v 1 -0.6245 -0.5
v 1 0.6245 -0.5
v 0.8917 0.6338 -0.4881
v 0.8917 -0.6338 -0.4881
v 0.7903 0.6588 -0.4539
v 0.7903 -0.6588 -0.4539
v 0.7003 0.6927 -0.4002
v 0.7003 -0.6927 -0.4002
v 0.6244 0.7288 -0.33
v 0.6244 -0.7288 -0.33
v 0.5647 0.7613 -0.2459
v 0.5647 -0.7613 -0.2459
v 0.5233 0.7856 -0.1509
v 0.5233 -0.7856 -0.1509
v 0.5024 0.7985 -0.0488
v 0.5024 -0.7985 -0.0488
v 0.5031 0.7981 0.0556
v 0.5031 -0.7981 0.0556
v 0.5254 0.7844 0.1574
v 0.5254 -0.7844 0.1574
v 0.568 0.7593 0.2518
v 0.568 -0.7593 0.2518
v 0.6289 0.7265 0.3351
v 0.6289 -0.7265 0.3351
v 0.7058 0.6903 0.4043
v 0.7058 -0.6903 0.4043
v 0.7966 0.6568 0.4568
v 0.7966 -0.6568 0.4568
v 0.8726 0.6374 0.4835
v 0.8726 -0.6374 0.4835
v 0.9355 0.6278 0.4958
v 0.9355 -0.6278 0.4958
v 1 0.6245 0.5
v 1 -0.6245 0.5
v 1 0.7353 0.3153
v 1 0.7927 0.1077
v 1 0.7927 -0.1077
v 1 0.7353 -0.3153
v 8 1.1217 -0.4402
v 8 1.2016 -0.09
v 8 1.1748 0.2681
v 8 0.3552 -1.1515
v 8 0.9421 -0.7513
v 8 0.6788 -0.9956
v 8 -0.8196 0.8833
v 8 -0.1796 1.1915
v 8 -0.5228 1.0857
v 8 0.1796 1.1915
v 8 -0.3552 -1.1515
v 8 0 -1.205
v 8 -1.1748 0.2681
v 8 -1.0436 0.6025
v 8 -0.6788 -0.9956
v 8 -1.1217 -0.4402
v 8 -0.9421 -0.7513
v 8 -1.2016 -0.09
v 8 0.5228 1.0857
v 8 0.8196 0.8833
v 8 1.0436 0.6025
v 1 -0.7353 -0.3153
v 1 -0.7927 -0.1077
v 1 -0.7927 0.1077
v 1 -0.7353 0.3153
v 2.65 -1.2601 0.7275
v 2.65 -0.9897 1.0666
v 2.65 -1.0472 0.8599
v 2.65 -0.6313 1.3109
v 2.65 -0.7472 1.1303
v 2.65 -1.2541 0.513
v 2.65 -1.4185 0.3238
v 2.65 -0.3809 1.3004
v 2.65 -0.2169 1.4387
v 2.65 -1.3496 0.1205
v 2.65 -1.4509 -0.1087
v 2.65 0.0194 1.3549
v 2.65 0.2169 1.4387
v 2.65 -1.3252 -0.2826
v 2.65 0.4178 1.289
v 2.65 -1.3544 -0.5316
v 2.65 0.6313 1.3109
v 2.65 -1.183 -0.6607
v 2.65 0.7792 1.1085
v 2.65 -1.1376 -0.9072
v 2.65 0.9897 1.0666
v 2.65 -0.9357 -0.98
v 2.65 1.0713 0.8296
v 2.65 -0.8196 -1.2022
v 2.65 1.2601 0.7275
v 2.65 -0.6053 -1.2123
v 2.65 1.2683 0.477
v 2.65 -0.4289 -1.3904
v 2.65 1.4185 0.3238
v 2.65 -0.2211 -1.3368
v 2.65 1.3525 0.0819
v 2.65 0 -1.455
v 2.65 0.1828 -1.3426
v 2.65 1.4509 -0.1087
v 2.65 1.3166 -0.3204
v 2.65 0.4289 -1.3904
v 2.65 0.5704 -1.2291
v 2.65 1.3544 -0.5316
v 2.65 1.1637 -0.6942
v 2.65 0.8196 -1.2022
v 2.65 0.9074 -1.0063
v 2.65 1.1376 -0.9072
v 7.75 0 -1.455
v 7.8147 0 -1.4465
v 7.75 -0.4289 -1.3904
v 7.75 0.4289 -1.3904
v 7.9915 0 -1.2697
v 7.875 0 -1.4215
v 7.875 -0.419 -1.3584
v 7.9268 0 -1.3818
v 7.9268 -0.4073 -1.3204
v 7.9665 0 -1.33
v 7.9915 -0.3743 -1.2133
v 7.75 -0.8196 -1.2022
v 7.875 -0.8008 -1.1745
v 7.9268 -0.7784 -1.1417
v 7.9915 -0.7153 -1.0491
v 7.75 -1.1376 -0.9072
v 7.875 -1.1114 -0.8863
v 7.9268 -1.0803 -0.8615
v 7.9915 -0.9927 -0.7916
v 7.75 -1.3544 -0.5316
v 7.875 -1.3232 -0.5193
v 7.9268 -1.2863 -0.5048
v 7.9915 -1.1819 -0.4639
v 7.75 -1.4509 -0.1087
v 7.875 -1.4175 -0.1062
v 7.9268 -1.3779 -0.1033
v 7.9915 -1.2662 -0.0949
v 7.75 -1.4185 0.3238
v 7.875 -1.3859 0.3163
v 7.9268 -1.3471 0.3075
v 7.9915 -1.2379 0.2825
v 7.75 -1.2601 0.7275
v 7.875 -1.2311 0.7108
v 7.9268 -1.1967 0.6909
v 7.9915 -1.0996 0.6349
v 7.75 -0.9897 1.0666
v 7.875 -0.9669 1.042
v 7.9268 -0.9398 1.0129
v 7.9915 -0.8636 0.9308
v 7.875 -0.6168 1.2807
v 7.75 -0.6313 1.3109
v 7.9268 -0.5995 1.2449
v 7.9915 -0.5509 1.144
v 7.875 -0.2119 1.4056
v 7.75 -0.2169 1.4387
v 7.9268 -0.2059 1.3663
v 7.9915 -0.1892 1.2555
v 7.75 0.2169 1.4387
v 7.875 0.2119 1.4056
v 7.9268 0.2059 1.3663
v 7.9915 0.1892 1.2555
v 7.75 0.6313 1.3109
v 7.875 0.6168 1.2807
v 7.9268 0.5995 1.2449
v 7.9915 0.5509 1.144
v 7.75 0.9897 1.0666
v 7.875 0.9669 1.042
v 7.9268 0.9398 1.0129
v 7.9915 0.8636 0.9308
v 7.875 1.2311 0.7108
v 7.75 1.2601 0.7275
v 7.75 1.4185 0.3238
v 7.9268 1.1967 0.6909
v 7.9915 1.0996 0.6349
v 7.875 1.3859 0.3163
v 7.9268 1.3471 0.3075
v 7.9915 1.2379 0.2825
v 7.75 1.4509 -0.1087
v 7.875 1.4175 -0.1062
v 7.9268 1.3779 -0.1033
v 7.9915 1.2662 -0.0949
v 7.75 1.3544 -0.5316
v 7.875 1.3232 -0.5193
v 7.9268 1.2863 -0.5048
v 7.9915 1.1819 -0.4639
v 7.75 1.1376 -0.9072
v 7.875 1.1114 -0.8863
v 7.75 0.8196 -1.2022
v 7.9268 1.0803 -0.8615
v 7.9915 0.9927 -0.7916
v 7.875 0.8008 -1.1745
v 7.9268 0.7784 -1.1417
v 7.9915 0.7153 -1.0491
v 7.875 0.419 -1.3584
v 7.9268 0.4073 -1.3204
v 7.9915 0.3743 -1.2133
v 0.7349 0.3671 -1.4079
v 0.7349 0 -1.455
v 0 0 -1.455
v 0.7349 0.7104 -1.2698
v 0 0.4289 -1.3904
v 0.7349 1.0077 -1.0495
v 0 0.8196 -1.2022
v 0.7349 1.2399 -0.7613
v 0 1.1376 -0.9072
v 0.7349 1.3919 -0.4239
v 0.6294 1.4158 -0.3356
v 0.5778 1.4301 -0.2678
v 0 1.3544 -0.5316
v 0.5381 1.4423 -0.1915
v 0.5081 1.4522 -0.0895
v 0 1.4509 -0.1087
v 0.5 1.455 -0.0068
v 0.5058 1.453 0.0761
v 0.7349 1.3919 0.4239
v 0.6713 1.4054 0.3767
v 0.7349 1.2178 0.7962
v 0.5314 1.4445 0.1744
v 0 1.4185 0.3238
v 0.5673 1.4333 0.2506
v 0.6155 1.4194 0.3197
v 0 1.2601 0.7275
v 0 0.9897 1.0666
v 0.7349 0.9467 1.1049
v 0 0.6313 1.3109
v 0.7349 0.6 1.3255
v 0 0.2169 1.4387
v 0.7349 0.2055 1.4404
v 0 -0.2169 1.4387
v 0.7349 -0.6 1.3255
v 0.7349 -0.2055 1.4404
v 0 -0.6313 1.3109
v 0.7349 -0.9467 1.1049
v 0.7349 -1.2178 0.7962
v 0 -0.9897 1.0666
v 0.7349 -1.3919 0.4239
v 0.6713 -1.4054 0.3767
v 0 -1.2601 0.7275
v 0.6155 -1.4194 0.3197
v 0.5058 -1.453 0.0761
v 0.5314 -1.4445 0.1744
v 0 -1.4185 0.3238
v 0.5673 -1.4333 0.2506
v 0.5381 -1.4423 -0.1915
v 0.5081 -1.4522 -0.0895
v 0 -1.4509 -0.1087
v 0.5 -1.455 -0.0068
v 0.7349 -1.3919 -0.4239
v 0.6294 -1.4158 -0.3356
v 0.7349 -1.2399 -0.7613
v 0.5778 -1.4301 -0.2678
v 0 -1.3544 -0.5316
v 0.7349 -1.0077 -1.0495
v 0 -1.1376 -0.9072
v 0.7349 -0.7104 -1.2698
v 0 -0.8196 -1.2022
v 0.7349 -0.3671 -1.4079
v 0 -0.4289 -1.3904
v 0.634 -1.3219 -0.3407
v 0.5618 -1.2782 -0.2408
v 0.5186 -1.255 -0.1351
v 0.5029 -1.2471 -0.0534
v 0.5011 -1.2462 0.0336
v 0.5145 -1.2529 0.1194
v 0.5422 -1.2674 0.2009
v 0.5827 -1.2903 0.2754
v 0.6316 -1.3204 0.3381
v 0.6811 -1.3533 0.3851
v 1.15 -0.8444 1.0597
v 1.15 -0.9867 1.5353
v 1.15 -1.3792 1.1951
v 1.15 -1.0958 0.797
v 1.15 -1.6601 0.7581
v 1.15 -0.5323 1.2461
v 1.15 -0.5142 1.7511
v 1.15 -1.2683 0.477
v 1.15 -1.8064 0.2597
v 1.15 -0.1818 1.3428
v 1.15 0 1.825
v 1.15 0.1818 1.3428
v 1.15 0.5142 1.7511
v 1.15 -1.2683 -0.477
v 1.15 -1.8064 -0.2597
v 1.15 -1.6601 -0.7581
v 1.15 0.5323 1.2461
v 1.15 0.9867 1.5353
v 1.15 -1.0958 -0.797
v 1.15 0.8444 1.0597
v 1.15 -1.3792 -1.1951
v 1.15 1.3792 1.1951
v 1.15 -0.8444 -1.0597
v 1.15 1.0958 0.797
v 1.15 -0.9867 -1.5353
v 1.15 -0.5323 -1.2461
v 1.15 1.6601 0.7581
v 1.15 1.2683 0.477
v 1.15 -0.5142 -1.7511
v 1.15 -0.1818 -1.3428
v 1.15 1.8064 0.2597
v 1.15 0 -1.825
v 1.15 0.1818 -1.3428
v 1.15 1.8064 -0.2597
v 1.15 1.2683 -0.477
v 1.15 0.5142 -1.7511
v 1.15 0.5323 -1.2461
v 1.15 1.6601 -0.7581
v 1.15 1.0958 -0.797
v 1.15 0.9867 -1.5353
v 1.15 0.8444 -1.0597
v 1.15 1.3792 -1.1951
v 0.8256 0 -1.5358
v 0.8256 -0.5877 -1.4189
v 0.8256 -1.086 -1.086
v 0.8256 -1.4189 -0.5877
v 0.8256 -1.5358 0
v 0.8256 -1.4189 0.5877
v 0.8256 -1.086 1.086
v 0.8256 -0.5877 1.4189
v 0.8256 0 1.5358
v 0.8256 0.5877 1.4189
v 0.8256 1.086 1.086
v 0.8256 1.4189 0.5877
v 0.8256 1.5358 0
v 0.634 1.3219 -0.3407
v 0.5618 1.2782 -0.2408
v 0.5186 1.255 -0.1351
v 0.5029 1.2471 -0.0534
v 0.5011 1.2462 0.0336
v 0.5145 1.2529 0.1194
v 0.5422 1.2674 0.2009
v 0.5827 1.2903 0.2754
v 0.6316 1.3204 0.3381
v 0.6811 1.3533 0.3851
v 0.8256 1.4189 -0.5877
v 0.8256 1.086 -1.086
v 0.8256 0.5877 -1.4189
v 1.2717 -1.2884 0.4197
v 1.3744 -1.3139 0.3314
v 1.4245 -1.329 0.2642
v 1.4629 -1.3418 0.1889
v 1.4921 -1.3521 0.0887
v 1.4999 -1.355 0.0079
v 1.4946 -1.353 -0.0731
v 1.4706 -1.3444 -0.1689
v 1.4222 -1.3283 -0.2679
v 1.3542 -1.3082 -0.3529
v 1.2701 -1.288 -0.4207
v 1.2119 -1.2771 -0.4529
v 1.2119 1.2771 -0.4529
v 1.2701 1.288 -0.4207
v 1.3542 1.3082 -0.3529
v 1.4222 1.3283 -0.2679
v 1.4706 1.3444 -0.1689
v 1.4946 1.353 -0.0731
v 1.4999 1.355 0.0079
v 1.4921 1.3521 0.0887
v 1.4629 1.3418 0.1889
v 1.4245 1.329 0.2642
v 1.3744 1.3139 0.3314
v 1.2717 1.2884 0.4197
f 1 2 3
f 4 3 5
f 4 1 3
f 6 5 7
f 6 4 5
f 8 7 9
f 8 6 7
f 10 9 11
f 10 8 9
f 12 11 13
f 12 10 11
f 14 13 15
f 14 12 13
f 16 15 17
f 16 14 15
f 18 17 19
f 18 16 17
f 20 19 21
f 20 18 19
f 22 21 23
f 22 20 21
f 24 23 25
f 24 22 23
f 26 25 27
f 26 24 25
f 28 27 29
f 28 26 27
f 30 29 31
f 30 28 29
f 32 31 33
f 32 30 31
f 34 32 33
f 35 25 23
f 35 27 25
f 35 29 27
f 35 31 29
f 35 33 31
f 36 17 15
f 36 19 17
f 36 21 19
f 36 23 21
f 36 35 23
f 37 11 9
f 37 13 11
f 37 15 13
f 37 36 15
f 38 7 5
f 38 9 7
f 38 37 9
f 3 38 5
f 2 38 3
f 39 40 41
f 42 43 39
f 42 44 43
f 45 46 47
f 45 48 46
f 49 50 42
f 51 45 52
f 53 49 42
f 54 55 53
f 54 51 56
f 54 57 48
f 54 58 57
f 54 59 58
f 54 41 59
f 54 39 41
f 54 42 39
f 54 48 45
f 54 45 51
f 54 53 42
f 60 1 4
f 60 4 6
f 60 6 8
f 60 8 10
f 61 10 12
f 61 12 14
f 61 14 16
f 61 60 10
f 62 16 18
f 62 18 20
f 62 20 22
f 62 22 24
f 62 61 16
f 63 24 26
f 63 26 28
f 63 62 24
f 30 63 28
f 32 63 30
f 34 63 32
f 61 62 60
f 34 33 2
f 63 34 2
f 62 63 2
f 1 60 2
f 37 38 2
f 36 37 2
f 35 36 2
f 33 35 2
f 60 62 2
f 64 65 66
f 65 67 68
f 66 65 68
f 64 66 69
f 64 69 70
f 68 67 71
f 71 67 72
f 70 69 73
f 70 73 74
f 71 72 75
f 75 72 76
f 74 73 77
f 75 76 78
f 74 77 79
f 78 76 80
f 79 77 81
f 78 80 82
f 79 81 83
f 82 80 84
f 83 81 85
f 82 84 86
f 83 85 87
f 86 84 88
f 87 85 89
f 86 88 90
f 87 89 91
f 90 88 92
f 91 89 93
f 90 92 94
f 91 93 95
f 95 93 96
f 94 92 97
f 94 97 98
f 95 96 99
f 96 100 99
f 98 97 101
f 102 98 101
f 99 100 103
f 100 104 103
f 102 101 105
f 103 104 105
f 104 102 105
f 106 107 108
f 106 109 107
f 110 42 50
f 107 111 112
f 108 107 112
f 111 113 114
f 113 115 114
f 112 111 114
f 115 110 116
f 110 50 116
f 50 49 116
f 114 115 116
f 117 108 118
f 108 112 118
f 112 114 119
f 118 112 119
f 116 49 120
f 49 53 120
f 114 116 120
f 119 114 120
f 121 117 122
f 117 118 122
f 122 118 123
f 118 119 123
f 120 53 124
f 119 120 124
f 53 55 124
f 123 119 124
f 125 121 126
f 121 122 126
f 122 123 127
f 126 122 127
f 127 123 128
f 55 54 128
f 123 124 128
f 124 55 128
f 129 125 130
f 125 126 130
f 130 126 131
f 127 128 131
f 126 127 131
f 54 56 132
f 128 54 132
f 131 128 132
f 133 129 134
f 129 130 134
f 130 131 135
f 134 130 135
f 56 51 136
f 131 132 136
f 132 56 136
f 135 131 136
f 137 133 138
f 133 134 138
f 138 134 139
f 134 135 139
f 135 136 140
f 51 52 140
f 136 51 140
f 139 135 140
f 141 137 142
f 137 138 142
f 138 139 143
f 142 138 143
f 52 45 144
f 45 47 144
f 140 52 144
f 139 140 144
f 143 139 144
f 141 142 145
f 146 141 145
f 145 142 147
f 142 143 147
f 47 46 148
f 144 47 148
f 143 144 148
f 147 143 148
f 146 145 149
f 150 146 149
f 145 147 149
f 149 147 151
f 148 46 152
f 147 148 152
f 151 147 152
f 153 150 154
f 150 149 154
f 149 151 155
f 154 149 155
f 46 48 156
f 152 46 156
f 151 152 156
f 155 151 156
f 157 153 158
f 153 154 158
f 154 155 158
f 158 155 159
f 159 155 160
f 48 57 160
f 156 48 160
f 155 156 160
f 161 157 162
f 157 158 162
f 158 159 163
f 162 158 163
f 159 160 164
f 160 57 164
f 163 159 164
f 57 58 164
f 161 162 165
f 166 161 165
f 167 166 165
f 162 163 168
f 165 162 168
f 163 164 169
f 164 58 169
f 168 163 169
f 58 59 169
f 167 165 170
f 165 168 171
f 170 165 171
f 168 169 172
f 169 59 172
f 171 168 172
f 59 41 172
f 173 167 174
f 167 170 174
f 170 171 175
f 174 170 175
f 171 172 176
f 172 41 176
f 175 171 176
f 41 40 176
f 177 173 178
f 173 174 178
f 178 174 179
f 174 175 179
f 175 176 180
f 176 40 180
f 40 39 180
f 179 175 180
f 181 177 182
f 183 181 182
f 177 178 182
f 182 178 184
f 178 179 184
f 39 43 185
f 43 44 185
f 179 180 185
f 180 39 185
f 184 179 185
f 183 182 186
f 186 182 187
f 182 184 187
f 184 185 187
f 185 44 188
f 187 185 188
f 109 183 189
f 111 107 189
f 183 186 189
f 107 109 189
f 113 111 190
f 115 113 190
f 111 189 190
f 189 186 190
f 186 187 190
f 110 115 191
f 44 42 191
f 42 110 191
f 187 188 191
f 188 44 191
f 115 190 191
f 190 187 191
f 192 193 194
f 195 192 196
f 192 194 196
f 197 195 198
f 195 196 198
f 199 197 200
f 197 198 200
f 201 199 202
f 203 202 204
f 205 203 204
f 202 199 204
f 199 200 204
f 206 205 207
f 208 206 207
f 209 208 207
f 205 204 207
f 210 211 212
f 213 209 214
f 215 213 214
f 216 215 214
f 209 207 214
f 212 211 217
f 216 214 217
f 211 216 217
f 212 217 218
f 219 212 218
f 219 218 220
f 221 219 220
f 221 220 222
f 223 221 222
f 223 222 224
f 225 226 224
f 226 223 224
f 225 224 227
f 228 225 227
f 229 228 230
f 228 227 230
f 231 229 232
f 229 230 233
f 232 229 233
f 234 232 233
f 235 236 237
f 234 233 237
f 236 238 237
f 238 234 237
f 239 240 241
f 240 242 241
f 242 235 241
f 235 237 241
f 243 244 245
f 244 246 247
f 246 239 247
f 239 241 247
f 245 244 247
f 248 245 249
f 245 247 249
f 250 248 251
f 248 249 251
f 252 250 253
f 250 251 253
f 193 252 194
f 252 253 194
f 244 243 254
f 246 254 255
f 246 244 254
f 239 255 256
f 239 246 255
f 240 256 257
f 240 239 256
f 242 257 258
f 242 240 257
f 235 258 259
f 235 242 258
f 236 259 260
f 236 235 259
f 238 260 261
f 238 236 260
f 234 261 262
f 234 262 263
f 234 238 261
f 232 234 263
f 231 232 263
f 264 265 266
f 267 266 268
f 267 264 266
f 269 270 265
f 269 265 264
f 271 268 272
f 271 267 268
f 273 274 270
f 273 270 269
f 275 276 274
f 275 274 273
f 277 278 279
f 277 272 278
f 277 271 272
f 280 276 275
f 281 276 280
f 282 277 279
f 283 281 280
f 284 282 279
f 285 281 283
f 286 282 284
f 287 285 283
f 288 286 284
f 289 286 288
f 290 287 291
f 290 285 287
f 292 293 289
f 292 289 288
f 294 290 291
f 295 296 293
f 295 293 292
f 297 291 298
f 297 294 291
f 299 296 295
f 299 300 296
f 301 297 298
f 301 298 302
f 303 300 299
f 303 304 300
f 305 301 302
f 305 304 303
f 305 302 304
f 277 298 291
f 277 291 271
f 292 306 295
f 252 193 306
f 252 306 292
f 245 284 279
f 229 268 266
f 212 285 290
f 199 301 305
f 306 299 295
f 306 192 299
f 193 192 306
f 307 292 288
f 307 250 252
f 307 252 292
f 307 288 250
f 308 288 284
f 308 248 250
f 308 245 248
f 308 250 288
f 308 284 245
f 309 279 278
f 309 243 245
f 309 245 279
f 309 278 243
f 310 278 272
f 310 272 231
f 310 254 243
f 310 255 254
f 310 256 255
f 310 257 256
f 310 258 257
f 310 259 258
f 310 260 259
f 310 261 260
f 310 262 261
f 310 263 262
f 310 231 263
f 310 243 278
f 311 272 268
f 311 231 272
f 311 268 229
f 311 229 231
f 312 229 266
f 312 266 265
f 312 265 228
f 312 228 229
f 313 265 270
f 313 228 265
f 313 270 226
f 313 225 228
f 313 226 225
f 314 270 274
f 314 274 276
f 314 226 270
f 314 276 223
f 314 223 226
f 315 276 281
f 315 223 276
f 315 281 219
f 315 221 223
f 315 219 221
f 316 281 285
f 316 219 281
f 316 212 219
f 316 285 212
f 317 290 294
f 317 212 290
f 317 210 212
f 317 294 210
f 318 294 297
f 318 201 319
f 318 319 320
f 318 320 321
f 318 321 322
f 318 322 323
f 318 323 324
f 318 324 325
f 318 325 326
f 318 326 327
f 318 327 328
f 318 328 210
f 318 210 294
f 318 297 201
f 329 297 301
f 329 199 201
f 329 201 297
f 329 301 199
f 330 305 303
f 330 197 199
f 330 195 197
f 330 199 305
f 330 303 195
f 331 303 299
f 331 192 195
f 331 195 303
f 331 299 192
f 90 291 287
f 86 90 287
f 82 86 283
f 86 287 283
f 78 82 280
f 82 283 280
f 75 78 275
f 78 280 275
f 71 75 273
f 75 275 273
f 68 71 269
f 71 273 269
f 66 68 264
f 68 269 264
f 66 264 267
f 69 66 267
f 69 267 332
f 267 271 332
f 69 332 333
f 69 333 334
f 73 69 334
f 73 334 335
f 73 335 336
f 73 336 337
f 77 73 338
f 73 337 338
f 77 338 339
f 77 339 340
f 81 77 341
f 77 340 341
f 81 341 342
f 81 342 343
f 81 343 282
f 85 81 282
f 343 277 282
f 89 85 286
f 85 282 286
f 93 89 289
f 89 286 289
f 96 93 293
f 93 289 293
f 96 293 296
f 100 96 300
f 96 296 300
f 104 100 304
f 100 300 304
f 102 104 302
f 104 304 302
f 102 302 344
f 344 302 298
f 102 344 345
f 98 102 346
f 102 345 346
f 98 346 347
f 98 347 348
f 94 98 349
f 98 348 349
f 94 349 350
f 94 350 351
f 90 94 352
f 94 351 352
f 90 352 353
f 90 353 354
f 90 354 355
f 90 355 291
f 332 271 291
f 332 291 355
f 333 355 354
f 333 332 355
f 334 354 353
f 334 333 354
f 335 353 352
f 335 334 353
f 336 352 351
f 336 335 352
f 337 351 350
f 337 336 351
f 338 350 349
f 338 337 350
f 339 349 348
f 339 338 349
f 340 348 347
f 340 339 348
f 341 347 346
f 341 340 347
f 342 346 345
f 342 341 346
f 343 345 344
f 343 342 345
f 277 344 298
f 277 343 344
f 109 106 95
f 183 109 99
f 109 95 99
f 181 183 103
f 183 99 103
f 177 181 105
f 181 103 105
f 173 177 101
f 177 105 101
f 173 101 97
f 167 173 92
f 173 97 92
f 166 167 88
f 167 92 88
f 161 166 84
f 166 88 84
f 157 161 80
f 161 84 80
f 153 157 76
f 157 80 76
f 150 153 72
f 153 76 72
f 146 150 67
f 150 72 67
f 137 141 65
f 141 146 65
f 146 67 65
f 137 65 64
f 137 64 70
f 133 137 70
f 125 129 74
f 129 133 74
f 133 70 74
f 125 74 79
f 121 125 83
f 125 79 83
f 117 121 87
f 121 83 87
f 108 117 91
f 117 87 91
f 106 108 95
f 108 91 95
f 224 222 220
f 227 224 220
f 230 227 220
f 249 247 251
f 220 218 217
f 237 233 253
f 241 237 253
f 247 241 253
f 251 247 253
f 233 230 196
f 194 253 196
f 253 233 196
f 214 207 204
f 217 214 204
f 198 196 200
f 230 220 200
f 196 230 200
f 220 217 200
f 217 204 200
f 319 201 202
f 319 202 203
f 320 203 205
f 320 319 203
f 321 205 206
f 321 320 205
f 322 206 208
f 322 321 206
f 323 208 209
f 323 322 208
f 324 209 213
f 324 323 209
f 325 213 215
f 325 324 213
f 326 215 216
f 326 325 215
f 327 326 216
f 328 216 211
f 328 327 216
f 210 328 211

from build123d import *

# Parameters (mm, degrees)
SKETCH2_R               = 1.455
BOSS_EXTRUDE3_DEPTH     = 6
SKETCH3_R               = 2.5
BOSS_EXTRUDE4_DEPTH     = 3
CUT_EXTRUDE1_DEPTH      = 10.669539803
CUT_EXTRUDE1_DEPTH_BACK = 10.669539803
SKETCH4_R               = 0.5
SKETCH6_R               = 1.575
BOSS_EXTRUDE5_DEPTH     = 0.15
CUT_EXTRUDE3_REACH      = 11.67
SKETCH9_R               = 2.5
SKETCH9_R_2             = 1.455
CUT_EXTRUDE4_START      = -1
SKETCH10_R              = 1.455
CUT_EXTRUDE4_DEPTH      = 1
FILLET1_R               = 0.25
SKETCH11_R              = 1.455
SKETCH11_R_2            = 1.355
CUT_EXTRUDE5_DEPTH      = 1.5


with BuildPart() as part:
    # Sketch2 → Boss-Extrude3 (new body)
    with BuildSketch(Plane(origin=(0, 0, 0), x_dir=(0, 0, -1), z_dir=(1, 0, 0))):
        Circle(SKETCH2_R)
    extrude(amount=BOSS_EXTRUDE3_DEPTH)

    # Sketch3 → Boss-Extrude4 (add)
    with BuildSketch(Plane(origin=(6, 0, 0), x_dir=(0, 0, -1), z_dir=(1, 0, 0))):
        Circle(SKETCH3_R)
    extrude(amount=BOSS_EXTRUDE4_DEPTH)

    # Sketch4 → Cut-Extrude1 (cut, two sides: drawn at the far end of the back side and taken through both)
    with BuildSketch(Plane(origin=(0, 0, 0), x_dir=(1, 0, 0), z_dir=(0, 1, 0)).offset(-CUT_EXTRUDE1_DEPTH_BACK)):
        with Locations((1, 0)):
            Circle(SKETCH4_R)
    extrude(amount=CUT_EXTRUDE1_DEPTH + CUT_EXTRUDE1_DEPTH_BACK, mode=Mode.SUBTRACT)

    # Sketch6 → Boss-Extrude5 (add)
    with BuildSketch(Plane.YZ.offset(1)):
        Circle(SKETCH6_R)
    extrude(amount=BOSS_EXTRUDE5_DEPTH)

    # Sketch7 → Revolve1 (revolve)
    with BuildSketch(Plane.XY):
        Polygon((1.15, 1.825), (0, 0.8), (1.15, 0.8), align=None)
    revolve(axis=Axis((9.45, 0, 0), (-1, 0, 0)))

    # Sketch9 → Cut-Extrude3 (cut, up to next)
    with BuildSketch(Plane(origin=(9, 0, 0), x_dir=(0, 0, -1), z_dir=(1, 0, 0)), mode=Mode.PRIVATE) as cut_extrude3_sk1:
        Circle(SKETCH9_R)
        Circle(SKETCH9_R_2, mode=Mode.SUBTRACT)
    cut_extrude3_tool1 = extrude(cut_extrude3_sk1.sketch, amount=-CUT_EXTRUDE3_REACH, mode=Mode.PRIVATE) & part.part
    add(cut_extrude3_tool1.solids().sort_by_distance((9, 0, 2.429289))[0], mode=Mode.SUBTRACT)

    # Sketch10 → Cut-Extrude4 (cut)
    with BuildSketch(Plane(origin=(9, 0, 0), x_dir=(0, 0, -1), z_dir=(1, 0, 0)).offset(CUT_EXTRUDE4_START)):
        Circle(SKETCH10_R)
    extrude(amount=CUT_EXTRUDE4_DEPTH, mode=Mode.SUBTRACT)

    # Fillet1
    fillet1_edges = [part.edges().sort_by_distance(p)[0] for p in [
        (8, 0, 1.455),
    ]]
    fillet(fillet1_edges, radius=FILLET1_R)

    # Sketch11 → Cut-Extrude5 (cut)
    with BuildSketch(Plane(origin=(1.15, 0, 0), x_dir=(0, 0, -1), z_dir=(1, 0, 0))):
        Circle(SKETCH11_R)
        Circle(SKETCH11_R_2, mode=Mode.SUBTRACT)
    extrude(amount=CUT_EXTRUDE5_DEPTH, mode=Mode.SUBTRACT)


solid = part.part
